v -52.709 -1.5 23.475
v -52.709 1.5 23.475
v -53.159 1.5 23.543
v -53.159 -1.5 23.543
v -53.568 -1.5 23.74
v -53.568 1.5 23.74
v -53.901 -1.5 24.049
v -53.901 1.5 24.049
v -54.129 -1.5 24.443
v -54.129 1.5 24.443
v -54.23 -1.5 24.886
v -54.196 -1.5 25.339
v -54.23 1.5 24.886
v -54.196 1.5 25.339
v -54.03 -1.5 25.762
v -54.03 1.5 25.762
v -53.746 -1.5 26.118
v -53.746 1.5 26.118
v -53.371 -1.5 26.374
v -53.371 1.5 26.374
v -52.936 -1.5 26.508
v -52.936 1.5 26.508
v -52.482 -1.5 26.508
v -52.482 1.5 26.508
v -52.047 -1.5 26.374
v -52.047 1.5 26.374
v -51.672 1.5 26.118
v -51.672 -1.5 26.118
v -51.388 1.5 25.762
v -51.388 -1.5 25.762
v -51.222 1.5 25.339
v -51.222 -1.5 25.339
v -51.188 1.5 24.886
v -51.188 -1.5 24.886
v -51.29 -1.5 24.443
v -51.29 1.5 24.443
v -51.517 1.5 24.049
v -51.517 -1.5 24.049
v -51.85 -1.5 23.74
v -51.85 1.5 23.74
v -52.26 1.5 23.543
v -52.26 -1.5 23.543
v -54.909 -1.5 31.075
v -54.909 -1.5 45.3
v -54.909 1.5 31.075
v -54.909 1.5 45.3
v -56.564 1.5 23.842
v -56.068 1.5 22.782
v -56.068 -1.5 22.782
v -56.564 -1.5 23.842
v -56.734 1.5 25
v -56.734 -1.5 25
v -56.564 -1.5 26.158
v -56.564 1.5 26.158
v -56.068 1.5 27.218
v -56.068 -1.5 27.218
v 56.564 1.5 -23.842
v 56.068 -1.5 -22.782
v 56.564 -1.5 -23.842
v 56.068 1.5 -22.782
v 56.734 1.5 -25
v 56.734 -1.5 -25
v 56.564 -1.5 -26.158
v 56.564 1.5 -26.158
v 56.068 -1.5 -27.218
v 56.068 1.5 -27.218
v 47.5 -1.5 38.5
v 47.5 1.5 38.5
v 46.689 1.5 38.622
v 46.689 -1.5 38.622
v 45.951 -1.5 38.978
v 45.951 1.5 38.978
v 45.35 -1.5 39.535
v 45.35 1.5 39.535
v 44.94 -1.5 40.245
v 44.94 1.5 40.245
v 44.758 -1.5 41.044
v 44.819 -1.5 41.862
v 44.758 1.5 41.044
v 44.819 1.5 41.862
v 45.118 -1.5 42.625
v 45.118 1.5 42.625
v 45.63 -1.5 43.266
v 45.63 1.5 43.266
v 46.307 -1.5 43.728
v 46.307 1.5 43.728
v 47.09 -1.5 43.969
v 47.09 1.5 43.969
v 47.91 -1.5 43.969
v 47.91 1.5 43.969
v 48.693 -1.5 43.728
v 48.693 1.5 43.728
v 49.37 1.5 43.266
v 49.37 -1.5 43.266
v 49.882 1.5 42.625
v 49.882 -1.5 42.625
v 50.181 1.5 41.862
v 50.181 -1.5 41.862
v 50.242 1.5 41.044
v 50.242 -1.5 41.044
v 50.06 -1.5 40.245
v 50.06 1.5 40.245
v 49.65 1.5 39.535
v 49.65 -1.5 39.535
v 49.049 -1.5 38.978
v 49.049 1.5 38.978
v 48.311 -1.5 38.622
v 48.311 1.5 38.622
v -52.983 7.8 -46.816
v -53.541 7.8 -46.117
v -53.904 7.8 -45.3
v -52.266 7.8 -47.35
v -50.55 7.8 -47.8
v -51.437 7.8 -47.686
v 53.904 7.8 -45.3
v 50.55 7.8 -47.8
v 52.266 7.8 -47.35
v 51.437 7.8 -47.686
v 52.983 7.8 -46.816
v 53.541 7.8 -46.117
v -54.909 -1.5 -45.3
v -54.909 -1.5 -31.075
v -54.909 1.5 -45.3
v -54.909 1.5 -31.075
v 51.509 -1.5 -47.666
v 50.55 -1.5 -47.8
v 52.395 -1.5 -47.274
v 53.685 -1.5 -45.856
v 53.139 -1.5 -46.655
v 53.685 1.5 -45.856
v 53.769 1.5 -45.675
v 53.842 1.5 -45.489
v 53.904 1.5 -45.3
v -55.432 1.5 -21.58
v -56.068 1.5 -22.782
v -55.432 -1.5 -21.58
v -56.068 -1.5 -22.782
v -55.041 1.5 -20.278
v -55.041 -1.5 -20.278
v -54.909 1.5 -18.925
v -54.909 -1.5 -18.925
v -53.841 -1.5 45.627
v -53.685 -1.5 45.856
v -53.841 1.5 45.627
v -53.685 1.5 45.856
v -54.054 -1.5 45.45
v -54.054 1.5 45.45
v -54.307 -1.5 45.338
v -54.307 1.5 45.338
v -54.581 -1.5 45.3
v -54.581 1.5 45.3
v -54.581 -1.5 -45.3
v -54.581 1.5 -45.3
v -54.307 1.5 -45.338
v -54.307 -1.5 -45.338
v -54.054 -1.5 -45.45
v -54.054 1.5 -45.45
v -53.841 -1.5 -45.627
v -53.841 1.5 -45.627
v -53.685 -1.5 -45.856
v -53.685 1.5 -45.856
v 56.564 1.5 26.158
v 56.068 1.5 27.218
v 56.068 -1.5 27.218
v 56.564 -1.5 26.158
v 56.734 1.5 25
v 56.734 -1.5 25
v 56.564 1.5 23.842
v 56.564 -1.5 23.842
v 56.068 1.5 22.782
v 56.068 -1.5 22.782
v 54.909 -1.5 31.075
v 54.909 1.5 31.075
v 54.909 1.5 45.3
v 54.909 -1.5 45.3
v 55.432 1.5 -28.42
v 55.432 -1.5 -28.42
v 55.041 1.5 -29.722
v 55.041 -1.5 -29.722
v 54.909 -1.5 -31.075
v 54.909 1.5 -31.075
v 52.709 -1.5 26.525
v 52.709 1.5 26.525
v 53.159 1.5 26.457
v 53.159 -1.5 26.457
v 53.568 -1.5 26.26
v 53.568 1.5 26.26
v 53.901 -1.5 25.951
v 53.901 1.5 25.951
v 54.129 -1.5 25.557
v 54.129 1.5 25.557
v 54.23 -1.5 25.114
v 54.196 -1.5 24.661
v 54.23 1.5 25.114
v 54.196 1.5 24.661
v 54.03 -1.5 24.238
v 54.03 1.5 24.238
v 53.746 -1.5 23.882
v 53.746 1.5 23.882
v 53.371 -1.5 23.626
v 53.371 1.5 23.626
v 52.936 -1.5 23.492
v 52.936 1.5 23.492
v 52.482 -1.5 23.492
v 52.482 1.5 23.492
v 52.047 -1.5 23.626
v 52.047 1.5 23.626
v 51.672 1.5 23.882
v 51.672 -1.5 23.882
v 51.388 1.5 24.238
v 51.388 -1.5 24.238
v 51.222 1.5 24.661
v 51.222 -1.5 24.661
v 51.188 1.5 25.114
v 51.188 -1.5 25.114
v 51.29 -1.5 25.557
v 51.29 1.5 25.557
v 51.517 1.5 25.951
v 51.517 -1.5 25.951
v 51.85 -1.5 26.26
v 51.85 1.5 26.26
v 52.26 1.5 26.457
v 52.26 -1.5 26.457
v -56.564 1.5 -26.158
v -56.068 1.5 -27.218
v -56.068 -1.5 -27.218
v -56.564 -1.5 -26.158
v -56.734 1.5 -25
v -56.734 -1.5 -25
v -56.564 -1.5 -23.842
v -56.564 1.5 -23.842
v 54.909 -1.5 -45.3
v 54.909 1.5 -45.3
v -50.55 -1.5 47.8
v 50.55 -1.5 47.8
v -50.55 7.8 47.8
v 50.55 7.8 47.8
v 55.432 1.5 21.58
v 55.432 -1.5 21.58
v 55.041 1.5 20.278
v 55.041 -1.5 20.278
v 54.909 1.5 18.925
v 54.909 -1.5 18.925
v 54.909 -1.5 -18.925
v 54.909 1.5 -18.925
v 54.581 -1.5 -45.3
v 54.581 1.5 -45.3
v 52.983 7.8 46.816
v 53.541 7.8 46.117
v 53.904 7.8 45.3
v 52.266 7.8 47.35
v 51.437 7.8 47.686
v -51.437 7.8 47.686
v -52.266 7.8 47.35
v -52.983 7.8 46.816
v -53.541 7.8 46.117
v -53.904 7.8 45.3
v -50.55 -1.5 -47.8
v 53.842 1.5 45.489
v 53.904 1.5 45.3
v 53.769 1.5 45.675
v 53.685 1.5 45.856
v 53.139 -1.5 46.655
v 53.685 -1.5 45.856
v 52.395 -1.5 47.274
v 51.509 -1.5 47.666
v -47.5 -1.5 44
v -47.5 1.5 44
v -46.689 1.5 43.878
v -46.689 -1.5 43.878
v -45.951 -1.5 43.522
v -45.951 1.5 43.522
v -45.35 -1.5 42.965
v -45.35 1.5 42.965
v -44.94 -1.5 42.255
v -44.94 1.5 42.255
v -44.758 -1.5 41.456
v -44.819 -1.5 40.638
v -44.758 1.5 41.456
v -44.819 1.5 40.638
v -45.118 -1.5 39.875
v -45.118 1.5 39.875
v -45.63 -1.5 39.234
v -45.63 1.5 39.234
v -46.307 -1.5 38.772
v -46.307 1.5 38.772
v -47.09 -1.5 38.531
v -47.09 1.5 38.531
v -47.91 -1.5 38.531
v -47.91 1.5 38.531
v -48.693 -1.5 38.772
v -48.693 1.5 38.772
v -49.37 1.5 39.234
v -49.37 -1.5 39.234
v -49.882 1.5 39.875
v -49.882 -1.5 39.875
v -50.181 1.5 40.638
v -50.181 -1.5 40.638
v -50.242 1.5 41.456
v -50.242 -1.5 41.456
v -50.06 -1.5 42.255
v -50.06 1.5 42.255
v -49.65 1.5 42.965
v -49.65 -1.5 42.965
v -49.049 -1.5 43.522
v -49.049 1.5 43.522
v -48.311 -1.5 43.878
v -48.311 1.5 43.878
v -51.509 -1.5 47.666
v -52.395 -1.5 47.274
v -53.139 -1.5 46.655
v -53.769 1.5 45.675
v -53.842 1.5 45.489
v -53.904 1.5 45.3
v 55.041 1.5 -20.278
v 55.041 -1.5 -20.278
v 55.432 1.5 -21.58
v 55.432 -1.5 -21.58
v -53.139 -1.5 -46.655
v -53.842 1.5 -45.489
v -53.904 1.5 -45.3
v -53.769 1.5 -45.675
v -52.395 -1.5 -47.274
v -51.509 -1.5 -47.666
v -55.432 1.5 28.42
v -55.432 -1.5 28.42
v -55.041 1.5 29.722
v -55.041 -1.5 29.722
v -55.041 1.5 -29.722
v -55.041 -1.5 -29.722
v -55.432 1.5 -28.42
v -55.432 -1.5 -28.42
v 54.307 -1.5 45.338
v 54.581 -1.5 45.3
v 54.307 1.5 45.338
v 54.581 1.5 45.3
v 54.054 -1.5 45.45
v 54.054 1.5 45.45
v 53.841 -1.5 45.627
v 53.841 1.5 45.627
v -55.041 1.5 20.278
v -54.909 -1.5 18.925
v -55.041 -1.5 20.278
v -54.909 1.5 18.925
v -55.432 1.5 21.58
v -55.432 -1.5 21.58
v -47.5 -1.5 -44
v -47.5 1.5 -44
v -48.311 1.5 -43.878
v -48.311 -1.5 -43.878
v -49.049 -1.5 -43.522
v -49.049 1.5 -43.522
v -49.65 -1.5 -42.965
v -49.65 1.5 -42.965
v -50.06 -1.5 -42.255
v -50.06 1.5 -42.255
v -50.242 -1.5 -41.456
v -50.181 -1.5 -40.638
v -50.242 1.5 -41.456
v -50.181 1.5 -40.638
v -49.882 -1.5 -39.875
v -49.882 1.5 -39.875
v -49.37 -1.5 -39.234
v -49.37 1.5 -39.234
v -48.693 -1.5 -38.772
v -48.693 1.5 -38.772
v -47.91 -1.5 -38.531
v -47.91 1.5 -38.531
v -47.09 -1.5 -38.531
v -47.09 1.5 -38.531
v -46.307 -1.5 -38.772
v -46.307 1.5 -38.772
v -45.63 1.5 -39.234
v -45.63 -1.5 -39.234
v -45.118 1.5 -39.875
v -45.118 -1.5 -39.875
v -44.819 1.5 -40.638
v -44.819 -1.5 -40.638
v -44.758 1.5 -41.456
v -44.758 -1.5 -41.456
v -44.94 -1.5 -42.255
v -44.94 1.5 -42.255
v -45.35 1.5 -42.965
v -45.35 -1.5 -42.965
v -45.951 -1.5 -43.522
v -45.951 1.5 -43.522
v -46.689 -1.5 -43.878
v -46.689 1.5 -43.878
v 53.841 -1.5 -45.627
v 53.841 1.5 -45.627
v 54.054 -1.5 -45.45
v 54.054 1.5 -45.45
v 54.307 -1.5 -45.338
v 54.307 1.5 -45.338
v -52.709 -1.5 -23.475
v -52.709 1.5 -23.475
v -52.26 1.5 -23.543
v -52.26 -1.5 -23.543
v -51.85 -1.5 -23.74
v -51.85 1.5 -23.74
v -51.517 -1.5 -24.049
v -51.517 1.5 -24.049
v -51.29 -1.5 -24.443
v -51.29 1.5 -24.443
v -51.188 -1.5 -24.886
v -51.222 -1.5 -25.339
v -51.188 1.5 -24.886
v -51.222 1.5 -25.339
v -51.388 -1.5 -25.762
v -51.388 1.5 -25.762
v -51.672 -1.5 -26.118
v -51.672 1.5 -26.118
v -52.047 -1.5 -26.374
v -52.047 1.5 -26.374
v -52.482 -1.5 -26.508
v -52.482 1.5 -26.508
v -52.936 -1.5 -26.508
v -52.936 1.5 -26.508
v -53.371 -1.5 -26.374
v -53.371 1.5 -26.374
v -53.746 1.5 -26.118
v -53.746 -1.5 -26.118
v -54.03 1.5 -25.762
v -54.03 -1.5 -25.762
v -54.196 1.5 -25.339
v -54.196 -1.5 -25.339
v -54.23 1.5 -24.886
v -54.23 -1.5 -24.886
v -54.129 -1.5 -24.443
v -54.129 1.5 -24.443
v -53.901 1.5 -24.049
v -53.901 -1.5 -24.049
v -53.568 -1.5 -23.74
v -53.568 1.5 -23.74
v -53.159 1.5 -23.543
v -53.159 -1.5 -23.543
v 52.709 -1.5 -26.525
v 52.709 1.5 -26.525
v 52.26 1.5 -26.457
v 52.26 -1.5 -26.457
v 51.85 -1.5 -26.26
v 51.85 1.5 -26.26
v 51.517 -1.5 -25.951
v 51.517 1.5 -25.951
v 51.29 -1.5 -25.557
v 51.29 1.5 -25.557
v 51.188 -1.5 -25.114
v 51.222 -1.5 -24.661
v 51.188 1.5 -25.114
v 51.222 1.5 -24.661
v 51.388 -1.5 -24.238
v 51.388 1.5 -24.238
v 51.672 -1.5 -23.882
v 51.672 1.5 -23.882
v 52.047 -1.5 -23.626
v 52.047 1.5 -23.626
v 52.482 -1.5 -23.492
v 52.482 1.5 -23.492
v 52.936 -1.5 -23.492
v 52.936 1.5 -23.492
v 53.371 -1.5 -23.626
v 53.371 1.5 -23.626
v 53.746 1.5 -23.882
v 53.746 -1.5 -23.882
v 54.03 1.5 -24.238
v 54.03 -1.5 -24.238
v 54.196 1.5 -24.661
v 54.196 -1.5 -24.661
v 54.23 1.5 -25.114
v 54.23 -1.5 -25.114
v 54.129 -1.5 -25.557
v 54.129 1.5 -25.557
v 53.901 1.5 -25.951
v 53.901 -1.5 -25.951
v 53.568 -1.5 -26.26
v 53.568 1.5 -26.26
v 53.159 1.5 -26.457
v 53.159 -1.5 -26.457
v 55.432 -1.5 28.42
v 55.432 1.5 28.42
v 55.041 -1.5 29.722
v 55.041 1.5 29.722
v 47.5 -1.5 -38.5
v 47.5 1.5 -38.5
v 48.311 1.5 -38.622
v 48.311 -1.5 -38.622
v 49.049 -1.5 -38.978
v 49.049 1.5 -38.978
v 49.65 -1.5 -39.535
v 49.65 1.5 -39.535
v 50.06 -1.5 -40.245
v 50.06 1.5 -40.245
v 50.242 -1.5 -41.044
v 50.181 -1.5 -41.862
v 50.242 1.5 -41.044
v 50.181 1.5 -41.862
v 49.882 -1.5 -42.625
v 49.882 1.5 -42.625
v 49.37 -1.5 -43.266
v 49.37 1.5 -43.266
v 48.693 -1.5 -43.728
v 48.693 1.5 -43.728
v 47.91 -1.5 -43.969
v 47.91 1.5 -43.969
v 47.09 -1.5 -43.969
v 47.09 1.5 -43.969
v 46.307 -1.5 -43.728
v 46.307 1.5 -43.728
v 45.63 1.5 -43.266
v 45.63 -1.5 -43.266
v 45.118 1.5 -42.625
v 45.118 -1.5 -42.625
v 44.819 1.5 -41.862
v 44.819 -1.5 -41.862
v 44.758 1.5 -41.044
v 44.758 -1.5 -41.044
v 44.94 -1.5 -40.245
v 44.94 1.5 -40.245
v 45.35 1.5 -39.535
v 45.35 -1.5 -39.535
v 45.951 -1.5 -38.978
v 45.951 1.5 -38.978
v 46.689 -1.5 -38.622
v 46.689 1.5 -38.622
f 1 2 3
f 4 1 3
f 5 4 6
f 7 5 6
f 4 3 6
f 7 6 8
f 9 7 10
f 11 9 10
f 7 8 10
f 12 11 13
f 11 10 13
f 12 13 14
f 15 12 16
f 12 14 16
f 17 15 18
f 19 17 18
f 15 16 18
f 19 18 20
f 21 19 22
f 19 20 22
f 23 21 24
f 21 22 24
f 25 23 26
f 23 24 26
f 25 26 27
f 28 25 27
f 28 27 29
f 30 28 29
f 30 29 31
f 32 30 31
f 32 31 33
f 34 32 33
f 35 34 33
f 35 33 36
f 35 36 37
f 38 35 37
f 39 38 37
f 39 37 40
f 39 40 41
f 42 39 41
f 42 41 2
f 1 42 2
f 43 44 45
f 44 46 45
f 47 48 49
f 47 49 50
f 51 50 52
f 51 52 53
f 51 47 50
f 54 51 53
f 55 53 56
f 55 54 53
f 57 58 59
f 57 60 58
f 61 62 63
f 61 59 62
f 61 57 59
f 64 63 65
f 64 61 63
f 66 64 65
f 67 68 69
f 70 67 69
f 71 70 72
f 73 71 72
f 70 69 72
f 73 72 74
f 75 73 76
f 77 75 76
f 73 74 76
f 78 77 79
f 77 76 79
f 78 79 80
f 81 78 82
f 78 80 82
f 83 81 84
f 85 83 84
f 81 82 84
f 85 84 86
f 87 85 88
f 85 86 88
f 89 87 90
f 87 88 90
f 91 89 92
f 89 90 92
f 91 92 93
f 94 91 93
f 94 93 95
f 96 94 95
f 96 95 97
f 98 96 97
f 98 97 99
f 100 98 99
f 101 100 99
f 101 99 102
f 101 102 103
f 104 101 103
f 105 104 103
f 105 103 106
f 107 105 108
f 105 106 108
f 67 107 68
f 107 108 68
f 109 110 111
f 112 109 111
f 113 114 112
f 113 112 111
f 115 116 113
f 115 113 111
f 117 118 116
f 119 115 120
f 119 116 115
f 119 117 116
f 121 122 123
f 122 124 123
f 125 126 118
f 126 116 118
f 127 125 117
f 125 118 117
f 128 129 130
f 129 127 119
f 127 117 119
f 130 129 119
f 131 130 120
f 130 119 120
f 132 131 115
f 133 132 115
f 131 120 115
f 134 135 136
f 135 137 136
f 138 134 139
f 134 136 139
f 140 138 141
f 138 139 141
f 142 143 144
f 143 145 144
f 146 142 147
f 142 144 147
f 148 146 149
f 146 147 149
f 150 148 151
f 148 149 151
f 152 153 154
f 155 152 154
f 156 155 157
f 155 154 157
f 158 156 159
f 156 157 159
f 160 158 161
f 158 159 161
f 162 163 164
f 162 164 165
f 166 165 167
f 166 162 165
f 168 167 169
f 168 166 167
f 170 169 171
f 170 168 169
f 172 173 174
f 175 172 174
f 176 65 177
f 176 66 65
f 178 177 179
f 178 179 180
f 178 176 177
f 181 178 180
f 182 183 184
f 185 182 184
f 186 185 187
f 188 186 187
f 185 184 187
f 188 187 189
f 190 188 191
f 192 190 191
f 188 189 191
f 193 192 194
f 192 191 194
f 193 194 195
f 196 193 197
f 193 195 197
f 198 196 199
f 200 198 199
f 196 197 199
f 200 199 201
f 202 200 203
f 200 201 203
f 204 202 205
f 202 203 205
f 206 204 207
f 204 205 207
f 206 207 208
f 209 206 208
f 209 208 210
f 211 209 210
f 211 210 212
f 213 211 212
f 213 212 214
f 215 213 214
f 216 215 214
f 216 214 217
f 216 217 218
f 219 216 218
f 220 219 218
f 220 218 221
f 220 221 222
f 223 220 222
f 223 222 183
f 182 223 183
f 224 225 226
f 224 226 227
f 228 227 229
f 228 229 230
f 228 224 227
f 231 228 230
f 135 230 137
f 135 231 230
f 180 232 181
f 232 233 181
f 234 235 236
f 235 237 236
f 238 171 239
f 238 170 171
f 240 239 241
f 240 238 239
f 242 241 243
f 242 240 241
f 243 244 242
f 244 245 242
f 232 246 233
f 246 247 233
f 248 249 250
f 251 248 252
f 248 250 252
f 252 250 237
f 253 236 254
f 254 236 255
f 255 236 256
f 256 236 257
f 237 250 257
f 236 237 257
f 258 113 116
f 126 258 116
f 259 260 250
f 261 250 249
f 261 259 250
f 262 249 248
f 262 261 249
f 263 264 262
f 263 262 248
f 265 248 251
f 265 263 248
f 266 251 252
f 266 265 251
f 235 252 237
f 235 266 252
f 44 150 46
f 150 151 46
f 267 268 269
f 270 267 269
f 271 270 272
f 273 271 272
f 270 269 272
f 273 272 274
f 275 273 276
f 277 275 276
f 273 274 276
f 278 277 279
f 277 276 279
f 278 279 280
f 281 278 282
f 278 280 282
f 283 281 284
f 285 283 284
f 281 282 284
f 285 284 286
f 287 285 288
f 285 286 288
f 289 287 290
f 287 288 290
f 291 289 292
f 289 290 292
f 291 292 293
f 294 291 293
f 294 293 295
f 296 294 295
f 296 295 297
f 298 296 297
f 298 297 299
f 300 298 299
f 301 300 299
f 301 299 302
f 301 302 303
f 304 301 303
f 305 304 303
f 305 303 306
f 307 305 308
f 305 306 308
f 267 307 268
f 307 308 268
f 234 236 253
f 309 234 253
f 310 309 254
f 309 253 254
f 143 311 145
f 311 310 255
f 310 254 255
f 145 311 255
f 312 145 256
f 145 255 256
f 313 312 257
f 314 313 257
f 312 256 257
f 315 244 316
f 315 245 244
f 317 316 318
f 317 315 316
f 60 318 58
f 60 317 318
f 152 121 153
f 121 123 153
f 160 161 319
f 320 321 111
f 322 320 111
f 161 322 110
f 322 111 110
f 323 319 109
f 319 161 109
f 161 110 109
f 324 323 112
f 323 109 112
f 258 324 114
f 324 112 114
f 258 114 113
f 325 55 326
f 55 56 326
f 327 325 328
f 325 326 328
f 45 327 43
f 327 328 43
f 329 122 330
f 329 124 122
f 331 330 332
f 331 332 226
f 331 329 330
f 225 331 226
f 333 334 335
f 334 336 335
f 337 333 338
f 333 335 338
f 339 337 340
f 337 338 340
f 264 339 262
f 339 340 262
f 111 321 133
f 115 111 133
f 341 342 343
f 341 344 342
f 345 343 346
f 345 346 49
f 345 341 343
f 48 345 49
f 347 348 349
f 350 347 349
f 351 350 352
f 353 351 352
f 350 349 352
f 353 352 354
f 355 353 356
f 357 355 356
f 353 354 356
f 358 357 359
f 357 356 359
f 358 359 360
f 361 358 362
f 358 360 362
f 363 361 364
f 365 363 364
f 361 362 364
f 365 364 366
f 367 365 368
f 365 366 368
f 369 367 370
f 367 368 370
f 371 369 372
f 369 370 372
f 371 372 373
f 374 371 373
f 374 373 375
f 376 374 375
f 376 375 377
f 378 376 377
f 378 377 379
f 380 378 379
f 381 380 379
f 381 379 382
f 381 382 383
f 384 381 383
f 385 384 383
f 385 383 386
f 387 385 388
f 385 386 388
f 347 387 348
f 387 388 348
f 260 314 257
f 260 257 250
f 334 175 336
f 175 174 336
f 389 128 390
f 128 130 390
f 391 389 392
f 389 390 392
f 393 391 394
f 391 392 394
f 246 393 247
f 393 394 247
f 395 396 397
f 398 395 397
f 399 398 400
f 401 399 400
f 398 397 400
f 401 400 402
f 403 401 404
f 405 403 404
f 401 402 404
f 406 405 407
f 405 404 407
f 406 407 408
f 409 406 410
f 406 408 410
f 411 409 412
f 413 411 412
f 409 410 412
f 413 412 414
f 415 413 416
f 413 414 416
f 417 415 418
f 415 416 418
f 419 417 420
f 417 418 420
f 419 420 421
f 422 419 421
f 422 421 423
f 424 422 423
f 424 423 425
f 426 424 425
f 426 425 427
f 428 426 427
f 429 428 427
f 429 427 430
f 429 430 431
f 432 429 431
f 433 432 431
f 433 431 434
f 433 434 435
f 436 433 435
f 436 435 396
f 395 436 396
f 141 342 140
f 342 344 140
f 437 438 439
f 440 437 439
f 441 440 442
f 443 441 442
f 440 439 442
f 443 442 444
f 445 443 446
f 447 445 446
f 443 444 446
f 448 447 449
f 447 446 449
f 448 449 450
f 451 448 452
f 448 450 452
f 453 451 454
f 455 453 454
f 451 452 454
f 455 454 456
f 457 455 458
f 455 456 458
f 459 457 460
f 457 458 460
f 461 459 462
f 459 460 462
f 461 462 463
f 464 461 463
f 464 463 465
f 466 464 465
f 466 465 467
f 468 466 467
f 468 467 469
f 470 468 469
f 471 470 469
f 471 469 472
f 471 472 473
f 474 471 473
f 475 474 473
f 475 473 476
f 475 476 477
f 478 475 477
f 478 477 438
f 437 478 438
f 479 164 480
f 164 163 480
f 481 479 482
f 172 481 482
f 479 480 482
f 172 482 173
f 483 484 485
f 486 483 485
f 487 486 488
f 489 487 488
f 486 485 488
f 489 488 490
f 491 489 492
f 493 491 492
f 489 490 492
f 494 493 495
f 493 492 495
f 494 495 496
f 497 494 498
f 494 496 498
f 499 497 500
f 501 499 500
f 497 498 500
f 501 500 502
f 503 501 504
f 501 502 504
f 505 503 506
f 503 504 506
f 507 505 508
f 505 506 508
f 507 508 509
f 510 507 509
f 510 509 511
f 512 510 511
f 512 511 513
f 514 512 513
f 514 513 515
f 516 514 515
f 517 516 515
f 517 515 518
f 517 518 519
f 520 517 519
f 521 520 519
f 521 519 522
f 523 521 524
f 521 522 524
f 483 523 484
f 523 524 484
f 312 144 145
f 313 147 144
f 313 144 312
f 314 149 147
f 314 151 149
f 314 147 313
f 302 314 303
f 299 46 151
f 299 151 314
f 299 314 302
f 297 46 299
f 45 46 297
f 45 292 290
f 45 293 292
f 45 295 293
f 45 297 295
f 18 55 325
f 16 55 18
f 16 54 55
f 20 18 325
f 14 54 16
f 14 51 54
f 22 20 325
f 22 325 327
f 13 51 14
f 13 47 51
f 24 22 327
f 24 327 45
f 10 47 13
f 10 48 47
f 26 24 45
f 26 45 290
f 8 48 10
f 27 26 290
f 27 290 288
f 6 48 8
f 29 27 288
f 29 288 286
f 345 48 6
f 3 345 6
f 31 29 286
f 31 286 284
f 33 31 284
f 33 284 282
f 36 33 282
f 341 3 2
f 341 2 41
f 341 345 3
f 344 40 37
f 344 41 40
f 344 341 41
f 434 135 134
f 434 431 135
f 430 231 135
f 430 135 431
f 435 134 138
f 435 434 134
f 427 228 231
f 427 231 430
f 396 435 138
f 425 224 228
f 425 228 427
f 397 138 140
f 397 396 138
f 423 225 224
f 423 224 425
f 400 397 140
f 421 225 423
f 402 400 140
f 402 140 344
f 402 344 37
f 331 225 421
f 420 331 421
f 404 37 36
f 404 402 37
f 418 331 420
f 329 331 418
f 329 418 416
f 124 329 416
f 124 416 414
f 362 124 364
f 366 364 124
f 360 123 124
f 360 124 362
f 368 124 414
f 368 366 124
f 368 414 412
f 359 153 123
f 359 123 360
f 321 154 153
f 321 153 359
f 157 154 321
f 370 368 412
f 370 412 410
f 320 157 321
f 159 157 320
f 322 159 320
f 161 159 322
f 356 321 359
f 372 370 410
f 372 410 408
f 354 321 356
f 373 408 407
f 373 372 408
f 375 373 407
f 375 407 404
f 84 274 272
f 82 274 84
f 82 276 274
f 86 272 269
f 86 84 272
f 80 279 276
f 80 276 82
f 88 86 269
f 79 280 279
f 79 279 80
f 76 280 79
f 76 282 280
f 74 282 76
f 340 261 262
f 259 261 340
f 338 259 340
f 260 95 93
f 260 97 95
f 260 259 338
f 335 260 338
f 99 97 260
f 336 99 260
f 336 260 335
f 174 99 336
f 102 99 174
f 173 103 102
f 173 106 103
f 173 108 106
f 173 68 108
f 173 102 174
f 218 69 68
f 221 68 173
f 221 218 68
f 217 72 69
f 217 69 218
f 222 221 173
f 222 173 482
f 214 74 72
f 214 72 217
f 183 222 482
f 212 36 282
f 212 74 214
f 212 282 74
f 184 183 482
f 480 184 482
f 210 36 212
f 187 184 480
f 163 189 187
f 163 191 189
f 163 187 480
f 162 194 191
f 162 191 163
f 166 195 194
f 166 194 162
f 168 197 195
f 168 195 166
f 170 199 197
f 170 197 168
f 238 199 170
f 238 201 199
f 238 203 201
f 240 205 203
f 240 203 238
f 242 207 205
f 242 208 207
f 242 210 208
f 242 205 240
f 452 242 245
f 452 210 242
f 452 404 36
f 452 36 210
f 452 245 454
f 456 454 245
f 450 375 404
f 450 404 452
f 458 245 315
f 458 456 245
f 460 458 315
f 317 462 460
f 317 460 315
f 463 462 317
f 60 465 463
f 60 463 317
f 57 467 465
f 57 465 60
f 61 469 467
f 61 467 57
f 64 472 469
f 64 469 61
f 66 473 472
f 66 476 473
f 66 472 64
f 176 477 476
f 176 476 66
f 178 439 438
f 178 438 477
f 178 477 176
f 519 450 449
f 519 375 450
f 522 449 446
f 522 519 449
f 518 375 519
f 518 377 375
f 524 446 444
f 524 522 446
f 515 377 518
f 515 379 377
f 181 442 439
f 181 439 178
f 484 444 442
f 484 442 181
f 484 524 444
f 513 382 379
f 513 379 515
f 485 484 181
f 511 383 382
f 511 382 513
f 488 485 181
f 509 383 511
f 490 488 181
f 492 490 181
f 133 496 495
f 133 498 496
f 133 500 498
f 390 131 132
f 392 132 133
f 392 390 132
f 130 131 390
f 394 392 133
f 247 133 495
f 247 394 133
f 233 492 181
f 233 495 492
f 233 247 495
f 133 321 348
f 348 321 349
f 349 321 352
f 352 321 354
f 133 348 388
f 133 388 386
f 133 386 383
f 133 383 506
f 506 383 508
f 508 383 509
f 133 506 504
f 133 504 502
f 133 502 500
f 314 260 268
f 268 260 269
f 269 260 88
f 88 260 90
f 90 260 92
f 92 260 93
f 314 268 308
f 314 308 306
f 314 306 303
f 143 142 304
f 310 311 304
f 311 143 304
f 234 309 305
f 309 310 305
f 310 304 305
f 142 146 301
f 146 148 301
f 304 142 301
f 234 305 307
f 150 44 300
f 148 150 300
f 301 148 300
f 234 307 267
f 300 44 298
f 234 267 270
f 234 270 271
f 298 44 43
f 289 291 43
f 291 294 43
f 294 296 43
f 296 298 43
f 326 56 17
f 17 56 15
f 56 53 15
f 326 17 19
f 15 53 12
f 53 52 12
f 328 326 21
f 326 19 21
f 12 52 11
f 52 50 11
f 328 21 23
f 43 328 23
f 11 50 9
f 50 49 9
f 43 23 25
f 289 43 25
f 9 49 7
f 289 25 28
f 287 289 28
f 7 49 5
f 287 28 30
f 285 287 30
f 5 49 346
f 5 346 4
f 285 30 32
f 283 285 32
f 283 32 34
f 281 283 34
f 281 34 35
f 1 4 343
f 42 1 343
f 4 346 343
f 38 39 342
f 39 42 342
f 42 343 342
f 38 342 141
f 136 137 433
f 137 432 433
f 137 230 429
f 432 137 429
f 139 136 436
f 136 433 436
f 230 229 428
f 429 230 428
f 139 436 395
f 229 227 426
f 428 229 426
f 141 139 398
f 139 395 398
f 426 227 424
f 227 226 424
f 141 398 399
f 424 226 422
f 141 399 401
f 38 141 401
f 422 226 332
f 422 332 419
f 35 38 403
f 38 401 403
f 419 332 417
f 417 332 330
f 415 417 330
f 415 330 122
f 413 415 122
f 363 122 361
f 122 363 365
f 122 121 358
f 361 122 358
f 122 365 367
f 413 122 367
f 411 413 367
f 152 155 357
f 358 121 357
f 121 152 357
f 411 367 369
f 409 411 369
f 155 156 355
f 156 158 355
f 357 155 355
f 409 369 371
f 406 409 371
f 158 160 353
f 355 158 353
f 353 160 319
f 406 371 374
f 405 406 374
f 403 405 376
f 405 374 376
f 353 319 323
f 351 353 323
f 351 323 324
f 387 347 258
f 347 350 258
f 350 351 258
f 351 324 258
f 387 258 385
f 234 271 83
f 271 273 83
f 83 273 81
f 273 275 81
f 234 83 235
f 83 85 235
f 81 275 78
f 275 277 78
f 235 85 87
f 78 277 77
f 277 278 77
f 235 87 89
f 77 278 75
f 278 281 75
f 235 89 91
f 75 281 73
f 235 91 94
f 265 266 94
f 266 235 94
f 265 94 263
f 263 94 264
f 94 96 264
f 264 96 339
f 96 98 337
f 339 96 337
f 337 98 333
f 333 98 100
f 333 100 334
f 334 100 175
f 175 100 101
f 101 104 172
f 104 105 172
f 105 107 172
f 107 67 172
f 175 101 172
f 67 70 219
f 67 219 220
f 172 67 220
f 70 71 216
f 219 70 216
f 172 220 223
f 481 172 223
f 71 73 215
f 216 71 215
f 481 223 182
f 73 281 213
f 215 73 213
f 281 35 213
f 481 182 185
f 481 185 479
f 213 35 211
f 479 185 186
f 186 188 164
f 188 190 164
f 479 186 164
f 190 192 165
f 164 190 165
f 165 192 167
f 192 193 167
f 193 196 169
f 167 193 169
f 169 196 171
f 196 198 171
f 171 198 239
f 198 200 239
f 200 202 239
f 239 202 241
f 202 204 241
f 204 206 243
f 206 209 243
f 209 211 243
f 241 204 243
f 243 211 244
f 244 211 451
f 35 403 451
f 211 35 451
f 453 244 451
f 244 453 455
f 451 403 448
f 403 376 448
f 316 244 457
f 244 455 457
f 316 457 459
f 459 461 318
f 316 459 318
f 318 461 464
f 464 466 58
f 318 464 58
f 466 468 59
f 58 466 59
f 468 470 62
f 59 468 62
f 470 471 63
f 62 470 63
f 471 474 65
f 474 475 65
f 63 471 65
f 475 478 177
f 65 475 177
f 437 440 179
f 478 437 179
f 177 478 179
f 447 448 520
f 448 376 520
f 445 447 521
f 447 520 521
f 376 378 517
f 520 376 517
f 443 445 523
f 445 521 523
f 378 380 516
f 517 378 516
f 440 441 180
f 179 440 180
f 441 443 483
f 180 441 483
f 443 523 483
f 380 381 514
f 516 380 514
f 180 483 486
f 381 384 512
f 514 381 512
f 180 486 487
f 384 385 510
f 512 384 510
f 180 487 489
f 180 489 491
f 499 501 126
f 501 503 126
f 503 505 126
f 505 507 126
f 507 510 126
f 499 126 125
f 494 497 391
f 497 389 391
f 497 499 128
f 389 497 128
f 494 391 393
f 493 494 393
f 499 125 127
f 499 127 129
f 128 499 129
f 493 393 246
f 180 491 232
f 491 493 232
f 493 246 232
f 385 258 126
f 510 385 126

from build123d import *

# Parameters (mm, degrees)
BOSS_EXTRUDE1_DEPTH   = 7.8
BOSS_EXTRUDE1_2_DEPTH = 7.8
BOSS_EXTRUDE2_DEPTH   = 1.5
SKETCH5_R             = 1.6
CUT_EXTRUDE1_DEPTH    = 74.072152553
SKETCH6_R             = 1.525
CUT_EXTRUDE2_DEPTH    = 74.072152553
SKETCH7_R             = 4.025
SKETCH7_R_2           = 1.525
BOSS_EXTRUDE3_DEPTH   = 1.5
FILLET1_R             = 7
SKETCH8_R             = 2.75
CUT_EXTRUDE3_DEPTH    = 3


with BuildPart() as part:
    # Sketch1 → Boss-Extrude1 (new body)
    with BuildSketch(Plane(origin=(0, 0, 0), x_dir=(1, 0, 0), z_dir=(0, 1, 0))):
        with BuildLine():
            Line((-50.55, -45.3), (50.55, -45.3))
            Line((50.55, -45.3), (53.904101966, -45.3))
            ThreePointArc((53.904101966, -45.3), (52.641650066, -47.10624304), (50.55, -47.8))
            Line((50.55, -47.8), (-50.55, -47.8))
            ThreePointArc((-50.55, -47.8), (-52.641650066, -47.10624304), (-53.904101966, -45.3))
            Line((-53.904101966, -45.3), (-50.55, -45.3))
        make_face()
    extrude(amount=BOSS_EXTRUDE1_DEPTH)



with BuildPart() as body_2:
    # Sketch1 → Boss-Extrude1 2 (new body)
    with BuildSketch(Plane(origin=(0, 0, 0), x_dir=(1, 0, 0), z_dir=(0, 1, 0))):
        with BuildLine():
            Line((-50.55, 45.3), (50.55, 45.3))
            Line((50.55, 45.3), (53.904101966, 45.3))
            ThreePointArc((53.904101966, 45.3), (52.641650066, 47.10624304), (50.55, 47.8))
            Line((50.55, 47.8), (-50.55, 47.8))
            ThreePointArc((-50.55, 47.8), (-52.641650066, 47.10624304), (-53.904101966, 45.3))
            Line((-53.904101966, 45.3), (-50.55, 45.3))
        make_face()
    extrude(amount=BOSS_EXTRUDE1_2_DEPTH)


with BuildPart() as part_1:
    add(part.part)

    add(body_2.part)  # Boss-Extrude2 merges body 2
    # Sketch3 → Boss-Extrude2 (add, symmetric)
    with BuildSketch(Plane(origin=(0, 0, 0), x_dir=(1, 0, 0), z_dir=(0, 1, 0))):
        with BuildLine():
            Line((-50.55, 47.8), (50.55, 47.8))
            ThreePointArc((50.55, 47.8), (52.394661968, 47.27442805), (53.685322458, 45.855555556))
            ThreePointArc((53.685322458, 45.855555556), (54.054082597, 45.450163414), (54.581128874, 45.3))
            Line((54.581128874, 45.3), (54.909101966, 45.3))
            Line((54.909101966, 45.3), (54.909101966, -45.3))
            Line((54.909101966, -45.3), (54.581128874, -45.3))
            ThreePointArc((54.581128874, -45.3), (54.054082597, -45.450163414), (53.685322458, -45.855555556))
            ThreePointArc((53.685322458, -45.855555556), (52.394661968, -47.27442805), (50.55, -47.8))
            Line((50.55, -47.8), (-50.55, -47.8))
            ThreePointArc((-50.55, -47.8), (-52.394661968, -47.27442805), (-53.685322458, -45.855555556))
            ThreePointArc((-53.685322458, -45.855555556), (-54.054082597, -45.450163414), (-54.581128874, -45.3))
            Line((-54.581128874, -45.3), (-54.909101966, -45.3))
            Line((-54.909101966, -45.3), (-54.909101966, 45.3))
            Line((-54.909101966, 45.3), (-54.581128874, 45.3))
            ThreePointArc((-54.581128874, 45.3), (-54.054082597, 45.450163414), (-53.685322458, 45.855555556))
            ThreePointArc((-53.685322458, 45.855555556), (-52.394661968, 47.27442805), (-50.55, 47.8))
        make_face()
    extrude(amount=BOSS_EXTRUDE2_DEPTH, both=True)

    # Sketch5 → Cut-Extrude1 (cut, through all)
    with BuildSketch(Plane(origin=(0, 1.5, 0), x_dir=(1, 0, 0), z_dir=(0, 1, 0))):
        with Locations(Location((-47.5, 41.25, 0), (0, 0, 270))):
            Circle(SKETCH5_R)
        with Locations(Location((47.5, 41.25, 0), (0, 0, 90))):
            Circle(SKETCH5_R)
        with Locations(Location((47.5, -41.25, 0), (0, 0, 270))):
            Circle(SKETCH5_R)
        with Locations(Location((-47.5, -41.25, 0), (0, 0, 90))):
            Circle(SKETCH5_R)
    extrude(amount=-CUT_EXTRUDE1_DEPTH, mode=Mode.SUBTRACT)

    # Sketch6 → Cut-Extrude2 (cut, through all)
    with BuildSketch(Plane(origin=(0, 1.5, 0), x_dir=(1, 0, 0), z_dir=(0, 1, 0))):
        with Locations(Location((-52.709101966, 25, 0), (0, 0, 270))):
            Circle(SKETCH6_R)
        with Locations(Location((52.709101966, 25, 0), (0, 0, 90))):
            Circle(SKETCH6_R)
        with Locations(Location((52.709101966, -25, 0), (0, 0, 270))):
            Circle(SKETCH6_R)
        with Locations(Location((-52.709101966, -25, 0), (0, 0, 90))):
            Circle(SKETCH6_R)
    extrude(amount=-CUT_EXTRUDE2_DEPTH, mode=Mode.SUBTRACT)

    # Sketch7 → Boss-Extrude3 (add, symmetric)
    # profile 1 of 4: a face of its own
    with BuildSketch(Plane(origin=(0, 0, 0), x_dir=(1, 0, 0), z_dir=(0, 1, 0))):
        with Locations((-52.709101966, 25)):
            Circle(SKETCH7_R)
        with Locations(Location((-52.709101966, 25, 0), (0, 0, 270))):
            Circle(SKETCH7_R_2, mode=Mode.SUBTRACT)
    # profile 2 of 4: a face of its own
    with BuildSketch(Plane(origin=(0, 0, 0), x_dir=(1, 0, 0), z_dir=(0, 1, 0))):
        with Locations((-52.709101966, -25)):
            Circle(SKETCH7_R)
        with Locations(Location((-52.709101966, -25, 0), (0, 0, 90))):
            Circle(SKETCH7_R_2, mode=Mode.SUBTRACT)
    # profile 3 of 4: a face of its own
    with BuildSketch(Plane(origin=(0, 0, 0), x_dir=(1, 0, 0), z_dir=(0, 1, 0))):
        with Locations((52.709101966, 25)):
            Circle(SKETCH7_R)
        with Locations(Location((52.709101966, 25, 0), (0, 0, 90))):
            Circle(SKETCH7_R_2, mode=Mode.SUBTRACT)
    # profile 4 of 4: a face of its own
    with BuildSketch(Plane(origin=(0, 0, 0), x_dir=(1, 0, 0), z_dir=(0, 1, 0))):
        with Locations((52.709101966, -25)):
            Circle(SKETCH7_R)
        with Locations(Location((52.709101966, -25, 0), (0, 0, 270))):
            Circle(SKETCH7_R_2, mode=Mode.SUBTRACT)
    extrude(amount=BOSS_EXTRUDE3_DEPTH, both=True)

    # Fillet1
    fillet1_edges = [part_1.edges().sort_by_distance(p)[0] for p in [
        (-54.909101966, 0, 28.370552625),
        (-54.909101966, 0, 21.629447375),
        (54.909101966, 0, -28.370552625),
        (54.909101966, 0, -21.629447375),
        (54.909101966, 0, 21.629447375),
        (54.909101966, 0, 28.370552625),
        (-54.909101966, 0, -21.629447375),
        (-54.909101966, 0, -28.370552625),
    ]]
    fillet(fillet1_edges, radius=FILLET1_R)

    # Sketch8 → Cut-Extrude3 (cut)
    with BuildSketch(Plane(origin=(0, 1.5, 0), x_dir=(1, 0, 0), z_dir=(0, 1, 0))):
        with Locations(Location((-47.5, -41.25, 0), (0, 0, 270))):
            Circle(SKETCH8_R)
        with Locations(Location((-47.5, 41.25, 0), (0, 0, 90))):
            Circle(SKETCH8_R)
        with Locations(Location((47.5, 41.25, 0), (0, 0, 270))):
            Circle(SKETCH8_R)
        with Locations(Location((47.5, -41.25, 0), (0, 0, 90))):
            Circle(SKETCH8_R)
    extrude(amount=-CUT_EXTRUDE3_DEPTH, mode=Mode.SUBTRACT)


solid = part_1.part
